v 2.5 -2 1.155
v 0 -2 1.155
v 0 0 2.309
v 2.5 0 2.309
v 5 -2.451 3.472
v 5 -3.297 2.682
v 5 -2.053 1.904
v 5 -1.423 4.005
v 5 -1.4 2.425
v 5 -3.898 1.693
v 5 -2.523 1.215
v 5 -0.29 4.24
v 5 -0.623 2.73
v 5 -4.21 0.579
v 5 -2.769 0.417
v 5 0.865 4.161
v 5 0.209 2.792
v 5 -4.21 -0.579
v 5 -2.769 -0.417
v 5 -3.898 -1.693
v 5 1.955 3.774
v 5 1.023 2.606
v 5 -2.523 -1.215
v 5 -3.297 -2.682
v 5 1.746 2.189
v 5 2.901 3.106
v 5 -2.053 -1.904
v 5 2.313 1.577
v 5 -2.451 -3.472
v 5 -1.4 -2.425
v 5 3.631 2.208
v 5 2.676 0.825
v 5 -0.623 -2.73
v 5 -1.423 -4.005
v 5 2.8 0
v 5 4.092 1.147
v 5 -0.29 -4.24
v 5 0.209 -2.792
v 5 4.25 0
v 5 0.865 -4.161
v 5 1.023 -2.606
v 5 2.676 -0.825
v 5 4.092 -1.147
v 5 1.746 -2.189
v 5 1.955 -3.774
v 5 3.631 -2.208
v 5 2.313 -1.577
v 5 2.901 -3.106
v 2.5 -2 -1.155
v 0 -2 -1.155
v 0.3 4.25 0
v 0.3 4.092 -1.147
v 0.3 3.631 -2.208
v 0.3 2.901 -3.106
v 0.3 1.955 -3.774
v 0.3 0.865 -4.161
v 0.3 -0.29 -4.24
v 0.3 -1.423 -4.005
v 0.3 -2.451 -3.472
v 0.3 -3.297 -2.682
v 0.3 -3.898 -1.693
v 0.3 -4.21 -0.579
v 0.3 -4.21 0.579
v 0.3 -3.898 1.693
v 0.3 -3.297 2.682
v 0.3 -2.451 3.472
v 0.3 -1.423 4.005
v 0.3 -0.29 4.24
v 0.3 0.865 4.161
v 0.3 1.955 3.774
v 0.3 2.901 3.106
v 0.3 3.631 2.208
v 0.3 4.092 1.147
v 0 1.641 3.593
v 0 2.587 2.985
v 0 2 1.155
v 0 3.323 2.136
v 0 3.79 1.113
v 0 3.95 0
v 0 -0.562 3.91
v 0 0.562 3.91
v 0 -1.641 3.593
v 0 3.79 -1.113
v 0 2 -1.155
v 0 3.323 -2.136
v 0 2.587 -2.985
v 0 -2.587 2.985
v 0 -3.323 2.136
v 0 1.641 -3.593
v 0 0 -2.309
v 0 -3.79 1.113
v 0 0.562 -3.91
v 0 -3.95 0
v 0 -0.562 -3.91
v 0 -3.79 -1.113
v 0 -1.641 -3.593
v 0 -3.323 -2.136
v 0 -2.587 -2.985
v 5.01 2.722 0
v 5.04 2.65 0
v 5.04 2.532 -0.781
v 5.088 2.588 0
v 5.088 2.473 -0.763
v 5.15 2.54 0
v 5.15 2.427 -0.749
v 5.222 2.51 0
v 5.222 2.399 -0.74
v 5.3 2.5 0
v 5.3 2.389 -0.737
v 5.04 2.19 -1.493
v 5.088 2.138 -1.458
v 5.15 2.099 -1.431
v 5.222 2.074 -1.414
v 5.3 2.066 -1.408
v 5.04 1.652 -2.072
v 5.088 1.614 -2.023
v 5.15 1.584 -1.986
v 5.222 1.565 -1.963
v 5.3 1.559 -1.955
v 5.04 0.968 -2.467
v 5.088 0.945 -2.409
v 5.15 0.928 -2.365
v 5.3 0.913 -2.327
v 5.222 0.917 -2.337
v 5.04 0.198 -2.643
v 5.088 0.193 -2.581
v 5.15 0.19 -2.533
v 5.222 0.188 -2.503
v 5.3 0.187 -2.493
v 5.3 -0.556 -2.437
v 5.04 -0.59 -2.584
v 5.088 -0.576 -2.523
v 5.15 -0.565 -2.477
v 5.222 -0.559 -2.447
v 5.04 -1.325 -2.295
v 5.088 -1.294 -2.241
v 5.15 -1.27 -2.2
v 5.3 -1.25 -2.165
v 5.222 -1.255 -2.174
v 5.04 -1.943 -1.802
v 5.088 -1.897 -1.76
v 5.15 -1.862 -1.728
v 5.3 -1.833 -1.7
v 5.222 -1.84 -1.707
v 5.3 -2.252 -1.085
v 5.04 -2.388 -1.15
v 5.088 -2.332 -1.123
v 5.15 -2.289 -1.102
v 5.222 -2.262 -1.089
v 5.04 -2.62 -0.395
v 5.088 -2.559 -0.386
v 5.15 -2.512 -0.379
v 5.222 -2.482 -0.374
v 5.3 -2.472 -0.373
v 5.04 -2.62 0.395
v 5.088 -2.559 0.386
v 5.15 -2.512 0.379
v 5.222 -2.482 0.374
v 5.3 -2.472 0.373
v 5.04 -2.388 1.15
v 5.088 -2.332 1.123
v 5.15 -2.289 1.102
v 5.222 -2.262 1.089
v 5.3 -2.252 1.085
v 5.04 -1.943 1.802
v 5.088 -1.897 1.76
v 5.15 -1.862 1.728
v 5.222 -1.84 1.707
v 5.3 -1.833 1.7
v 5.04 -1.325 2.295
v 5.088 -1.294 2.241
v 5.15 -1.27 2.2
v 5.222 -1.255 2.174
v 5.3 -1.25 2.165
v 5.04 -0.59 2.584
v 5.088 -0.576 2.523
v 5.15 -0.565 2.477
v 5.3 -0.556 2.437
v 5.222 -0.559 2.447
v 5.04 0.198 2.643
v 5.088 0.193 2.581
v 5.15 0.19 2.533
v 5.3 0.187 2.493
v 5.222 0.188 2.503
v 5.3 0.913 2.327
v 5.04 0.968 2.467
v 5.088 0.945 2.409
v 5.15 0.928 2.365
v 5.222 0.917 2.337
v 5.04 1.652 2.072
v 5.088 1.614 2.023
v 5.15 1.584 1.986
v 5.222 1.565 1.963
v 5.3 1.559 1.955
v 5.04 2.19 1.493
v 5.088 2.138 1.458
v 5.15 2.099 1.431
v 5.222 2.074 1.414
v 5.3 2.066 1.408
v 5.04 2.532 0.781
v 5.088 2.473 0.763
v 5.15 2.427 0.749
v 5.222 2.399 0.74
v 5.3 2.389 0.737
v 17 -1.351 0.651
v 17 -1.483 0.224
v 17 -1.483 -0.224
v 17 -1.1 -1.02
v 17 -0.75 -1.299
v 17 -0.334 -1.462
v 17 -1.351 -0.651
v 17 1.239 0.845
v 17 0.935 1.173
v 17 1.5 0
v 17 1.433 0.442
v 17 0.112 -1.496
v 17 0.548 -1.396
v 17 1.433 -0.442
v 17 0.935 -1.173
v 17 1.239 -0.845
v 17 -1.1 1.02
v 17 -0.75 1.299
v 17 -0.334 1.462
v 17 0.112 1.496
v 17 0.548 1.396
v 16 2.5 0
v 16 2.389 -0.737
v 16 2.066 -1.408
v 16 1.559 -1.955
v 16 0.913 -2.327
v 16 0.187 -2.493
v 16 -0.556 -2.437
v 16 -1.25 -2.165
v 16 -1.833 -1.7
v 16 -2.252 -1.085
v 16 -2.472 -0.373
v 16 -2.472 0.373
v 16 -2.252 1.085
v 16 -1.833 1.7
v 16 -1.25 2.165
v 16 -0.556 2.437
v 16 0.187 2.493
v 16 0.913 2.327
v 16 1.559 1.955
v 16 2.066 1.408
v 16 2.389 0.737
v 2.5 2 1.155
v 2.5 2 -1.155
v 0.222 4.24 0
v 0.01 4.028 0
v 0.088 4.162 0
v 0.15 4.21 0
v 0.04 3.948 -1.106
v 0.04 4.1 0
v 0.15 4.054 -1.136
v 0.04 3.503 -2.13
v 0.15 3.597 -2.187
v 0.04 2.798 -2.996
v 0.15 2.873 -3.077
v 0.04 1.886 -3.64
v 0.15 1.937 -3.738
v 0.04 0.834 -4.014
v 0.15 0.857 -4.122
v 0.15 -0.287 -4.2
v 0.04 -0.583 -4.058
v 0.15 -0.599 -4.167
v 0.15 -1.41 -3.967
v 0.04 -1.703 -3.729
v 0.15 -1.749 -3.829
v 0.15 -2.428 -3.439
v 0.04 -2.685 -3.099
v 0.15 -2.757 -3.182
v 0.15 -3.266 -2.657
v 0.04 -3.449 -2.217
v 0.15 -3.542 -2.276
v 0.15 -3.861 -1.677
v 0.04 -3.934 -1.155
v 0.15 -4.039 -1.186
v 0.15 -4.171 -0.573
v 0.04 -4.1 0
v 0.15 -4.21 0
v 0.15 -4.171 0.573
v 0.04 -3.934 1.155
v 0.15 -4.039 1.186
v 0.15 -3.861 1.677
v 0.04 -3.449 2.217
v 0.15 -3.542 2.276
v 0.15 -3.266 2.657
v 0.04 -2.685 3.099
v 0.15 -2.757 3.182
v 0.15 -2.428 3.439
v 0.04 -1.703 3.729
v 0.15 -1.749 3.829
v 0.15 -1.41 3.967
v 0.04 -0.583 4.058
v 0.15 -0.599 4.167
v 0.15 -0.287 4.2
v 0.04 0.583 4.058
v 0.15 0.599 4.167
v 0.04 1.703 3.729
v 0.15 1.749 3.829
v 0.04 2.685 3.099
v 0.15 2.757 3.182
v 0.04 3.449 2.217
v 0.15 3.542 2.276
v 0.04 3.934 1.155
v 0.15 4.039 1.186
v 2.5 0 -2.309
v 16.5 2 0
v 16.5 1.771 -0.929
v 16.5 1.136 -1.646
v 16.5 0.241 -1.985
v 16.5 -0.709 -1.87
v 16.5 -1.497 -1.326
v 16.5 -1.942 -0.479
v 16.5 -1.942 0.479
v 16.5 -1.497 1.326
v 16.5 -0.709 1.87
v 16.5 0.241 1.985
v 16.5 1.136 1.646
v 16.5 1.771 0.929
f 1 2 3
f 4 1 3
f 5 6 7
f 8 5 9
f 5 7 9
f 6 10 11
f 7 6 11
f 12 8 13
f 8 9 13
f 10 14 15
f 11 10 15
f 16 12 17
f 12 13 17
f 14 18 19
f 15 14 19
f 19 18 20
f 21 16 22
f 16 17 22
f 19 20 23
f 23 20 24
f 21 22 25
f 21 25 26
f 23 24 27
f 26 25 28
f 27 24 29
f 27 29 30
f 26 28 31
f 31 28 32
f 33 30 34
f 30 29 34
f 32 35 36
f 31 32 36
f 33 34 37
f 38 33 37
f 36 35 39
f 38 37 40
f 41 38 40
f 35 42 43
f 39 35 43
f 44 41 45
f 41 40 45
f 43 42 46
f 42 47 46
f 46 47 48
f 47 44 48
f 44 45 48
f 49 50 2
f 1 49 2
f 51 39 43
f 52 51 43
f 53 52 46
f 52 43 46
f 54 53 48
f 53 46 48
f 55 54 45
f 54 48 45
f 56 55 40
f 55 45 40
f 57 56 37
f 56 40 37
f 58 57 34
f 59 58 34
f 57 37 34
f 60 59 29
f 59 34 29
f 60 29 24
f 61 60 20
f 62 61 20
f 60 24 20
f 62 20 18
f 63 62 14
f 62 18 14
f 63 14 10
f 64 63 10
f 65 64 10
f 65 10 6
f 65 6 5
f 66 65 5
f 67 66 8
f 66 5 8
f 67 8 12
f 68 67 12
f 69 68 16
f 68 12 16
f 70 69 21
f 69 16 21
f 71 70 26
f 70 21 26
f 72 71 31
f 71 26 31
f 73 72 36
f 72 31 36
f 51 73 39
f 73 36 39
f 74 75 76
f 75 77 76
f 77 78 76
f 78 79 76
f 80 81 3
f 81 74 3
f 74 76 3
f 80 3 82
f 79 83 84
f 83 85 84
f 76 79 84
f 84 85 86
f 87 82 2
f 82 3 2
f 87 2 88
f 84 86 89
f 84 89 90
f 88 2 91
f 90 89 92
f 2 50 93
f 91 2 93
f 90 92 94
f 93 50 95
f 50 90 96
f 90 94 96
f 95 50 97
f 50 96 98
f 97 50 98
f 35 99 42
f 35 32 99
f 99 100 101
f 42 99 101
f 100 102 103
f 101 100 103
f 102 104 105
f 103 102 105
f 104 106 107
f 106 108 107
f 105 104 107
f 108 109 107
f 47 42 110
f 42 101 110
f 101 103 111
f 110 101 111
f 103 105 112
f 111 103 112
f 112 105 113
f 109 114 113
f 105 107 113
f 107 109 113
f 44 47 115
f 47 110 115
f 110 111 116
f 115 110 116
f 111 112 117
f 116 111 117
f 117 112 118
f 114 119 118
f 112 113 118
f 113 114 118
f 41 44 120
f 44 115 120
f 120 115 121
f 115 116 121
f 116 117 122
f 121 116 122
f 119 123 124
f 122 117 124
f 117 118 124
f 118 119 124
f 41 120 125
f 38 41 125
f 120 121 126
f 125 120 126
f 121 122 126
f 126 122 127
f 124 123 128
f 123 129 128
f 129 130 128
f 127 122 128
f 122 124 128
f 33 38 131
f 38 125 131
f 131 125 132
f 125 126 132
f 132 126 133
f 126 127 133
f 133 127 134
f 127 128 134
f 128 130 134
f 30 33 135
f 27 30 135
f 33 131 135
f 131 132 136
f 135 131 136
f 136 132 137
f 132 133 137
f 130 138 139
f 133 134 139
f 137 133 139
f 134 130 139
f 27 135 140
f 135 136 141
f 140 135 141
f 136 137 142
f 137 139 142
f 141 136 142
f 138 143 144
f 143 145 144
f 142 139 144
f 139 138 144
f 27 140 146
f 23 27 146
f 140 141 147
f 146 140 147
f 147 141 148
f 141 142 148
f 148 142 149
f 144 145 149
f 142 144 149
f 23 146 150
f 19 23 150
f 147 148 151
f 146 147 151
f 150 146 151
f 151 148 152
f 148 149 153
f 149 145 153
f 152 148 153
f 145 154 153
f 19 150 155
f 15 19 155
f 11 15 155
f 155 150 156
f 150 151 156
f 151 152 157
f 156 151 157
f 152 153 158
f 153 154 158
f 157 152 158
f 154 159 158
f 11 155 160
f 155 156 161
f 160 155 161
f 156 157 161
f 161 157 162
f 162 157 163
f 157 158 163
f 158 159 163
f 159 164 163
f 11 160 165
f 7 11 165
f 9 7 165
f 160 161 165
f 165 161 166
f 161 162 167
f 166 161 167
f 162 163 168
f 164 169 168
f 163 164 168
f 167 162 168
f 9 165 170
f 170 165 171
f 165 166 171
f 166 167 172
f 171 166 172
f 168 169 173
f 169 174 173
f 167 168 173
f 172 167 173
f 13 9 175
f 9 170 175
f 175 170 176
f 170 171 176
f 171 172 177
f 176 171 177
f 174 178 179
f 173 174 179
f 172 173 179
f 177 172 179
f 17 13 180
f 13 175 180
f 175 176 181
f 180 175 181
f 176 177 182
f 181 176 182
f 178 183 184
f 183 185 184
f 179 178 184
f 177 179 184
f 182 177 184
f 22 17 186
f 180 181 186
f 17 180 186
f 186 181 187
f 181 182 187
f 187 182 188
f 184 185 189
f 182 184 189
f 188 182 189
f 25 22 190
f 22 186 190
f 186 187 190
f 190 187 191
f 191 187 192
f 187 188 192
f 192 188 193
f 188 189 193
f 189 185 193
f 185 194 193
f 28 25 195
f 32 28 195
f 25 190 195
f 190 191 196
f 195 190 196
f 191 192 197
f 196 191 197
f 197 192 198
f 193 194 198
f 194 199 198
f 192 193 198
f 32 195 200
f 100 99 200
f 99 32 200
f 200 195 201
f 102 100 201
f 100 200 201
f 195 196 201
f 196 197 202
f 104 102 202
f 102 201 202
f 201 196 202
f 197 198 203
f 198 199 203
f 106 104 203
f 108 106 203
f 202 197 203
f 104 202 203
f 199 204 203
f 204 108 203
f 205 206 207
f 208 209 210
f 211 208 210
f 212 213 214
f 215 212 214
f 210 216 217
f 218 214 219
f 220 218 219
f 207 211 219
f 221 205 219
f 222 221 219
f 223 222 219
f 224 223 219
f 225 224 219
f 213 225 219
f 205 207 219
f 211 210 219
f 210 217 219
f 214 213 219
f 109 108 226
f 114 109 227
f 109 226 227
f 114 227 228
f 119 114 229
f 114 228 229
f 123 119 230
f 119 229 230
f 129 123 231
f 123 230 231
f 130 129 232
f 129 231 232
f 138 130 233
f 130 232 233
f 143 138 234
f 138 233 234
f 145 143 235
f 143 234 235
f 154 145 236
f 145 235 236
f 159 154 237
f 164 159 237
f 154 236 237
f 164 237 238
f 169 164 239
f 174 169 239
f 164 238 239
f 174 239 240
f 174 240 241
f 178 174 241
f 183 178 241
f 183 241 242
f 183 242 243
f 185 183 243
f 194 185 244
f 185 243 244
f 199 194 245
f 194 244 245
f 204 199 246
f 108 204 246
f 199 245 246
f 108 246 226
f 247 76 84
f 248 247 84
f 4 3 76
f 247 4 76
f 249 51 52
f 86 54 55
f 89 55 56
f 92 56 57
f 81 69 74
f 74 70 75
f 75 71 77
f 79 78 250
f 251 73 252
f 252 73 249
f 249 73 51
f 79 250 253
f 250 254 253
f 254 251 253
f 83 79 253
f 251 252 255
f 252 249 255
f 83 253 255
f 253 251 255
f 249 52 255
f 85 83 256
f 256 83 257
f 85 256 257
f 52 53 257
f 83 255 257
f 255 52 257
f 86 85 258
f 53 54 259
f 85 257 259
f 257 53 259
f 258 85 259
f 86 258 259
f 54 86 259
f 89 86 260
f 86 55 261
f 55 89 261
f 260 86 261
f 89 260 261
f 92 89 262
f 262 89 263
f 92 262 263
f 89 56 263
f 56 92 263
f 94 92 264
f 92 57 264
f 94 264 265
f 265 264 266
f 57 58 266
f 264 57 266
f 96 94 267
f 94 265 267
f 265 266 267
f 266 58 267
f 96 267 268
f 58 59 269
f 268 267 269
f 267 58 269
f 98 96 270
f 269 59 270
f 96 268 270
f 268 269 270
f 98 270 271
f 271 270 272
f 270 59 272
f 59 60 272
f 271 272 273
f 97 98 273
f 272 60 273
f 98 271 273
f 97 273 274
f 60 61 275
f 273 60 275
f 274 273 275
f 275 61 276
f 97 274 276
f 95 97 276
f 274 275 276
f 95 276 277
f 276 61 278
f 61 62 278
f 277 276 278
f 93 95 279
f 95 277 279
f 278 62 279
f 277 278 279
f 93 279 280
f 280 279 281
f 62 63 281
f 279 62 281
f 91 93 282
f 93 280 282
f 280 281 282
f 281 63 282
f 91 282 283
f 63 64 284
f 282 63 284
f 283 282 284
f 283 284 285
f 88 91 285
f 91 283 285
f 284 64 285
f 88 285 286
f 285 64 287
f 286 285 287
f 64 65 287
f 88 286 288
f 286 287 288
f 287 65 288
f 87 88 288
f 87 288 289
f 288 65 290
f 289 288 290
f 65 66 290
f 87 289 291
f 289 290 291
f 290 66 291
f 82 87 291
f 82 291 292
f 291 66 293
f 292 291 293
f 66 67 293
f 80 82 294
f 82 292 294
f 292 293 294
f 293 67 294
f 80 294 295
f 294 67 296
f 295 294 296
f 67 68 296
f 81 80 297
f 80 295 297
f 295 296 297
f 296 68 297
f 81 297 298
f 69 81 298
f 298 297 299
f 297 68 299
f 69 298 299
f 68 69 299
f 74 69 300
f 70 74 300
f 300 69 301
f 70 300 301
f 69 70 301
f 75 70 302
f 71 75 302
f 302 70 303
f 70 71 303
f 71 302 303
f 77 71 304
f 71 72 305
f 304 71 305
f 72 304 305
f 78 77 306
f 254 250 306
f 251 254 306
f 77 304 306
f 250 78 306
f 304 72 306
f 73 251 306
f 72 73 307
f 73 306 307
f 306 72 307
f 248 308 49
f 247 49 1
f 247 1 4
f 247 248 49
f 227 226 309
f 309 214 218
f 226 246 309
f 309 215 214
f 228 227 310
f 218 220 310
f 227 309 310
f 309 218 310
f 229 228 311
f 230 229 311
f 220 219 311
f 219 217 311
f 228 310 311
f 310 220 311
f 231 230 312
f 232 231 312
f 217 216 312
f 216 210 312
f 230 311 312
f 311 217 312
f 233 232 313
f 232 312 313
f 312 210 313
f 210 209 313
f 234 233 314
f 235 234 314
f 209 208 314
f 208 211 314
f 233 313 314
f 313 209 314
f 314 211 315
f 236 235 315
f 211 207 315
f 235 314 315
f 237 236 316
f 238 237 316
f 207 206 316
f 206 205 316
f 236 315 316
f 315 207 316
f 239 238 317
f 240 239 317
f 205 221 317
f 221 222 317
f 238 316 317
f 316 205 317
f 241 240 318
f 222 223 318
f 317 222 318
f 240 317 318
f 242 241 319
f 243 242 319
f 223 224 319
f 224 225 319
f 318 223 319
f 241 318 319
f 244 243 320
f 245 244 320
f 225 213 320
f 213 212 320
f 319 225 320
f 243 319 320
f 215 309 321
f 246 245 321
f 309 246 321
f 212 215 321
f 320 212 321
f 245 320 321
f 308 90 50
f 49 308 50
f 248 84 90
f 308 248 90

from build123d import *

# Parameters (mm, degrees)
CUT_EXTRUDE_1_DEPTH = 2.5
FILLET_1_R          = 0.3
CHAMFER_1_SIZE      = 1


with BuildPart() as part:
    # Эскиз1 → Повернуть1 (revolve)
    with BuildSketch(Plane.XY):
        Polygon((0, 0), (0, 4.25), (5, 4.25), (5, 2.5), (17, 2.5), (17, 0), align=None)
    revolve(axis=Axis((17, 0, 0), (-1, 0, 0)))

    # Эскиз2 → Вырез-Вытянуть1 (cut)
    with BuildSketch(Plane.ZY):
        Polygon((-1.154700538, 2), (-2.309401077, 0), (-1.154700538, -2), (1.154700538, -2), (2.309401077, 0), (1.154700538, 2), align=None)
    extrude(amount=-CUT_EXTRUDE_1_DEPTH, mode=Mode.SUBTRACT)

    # Скругление1
    fillet_1_edges = [part.edges().sort_by_distance(p)[0] for p in [
        (5, -2.5, 0),
        (0, -4.25, 0),
    ]]
    fillet(fillet_1_edges, radius=FILLET_1_R)

    # Фаска1
    chamfer_1_edges = [part.edges().sort_by_distance(p)[0] for p in [
        (17, -2.5, 0),
    ]]
    chamfer(chamfer_1_edges, length=CHAMFER_1_SIZE)


solid = part.part
